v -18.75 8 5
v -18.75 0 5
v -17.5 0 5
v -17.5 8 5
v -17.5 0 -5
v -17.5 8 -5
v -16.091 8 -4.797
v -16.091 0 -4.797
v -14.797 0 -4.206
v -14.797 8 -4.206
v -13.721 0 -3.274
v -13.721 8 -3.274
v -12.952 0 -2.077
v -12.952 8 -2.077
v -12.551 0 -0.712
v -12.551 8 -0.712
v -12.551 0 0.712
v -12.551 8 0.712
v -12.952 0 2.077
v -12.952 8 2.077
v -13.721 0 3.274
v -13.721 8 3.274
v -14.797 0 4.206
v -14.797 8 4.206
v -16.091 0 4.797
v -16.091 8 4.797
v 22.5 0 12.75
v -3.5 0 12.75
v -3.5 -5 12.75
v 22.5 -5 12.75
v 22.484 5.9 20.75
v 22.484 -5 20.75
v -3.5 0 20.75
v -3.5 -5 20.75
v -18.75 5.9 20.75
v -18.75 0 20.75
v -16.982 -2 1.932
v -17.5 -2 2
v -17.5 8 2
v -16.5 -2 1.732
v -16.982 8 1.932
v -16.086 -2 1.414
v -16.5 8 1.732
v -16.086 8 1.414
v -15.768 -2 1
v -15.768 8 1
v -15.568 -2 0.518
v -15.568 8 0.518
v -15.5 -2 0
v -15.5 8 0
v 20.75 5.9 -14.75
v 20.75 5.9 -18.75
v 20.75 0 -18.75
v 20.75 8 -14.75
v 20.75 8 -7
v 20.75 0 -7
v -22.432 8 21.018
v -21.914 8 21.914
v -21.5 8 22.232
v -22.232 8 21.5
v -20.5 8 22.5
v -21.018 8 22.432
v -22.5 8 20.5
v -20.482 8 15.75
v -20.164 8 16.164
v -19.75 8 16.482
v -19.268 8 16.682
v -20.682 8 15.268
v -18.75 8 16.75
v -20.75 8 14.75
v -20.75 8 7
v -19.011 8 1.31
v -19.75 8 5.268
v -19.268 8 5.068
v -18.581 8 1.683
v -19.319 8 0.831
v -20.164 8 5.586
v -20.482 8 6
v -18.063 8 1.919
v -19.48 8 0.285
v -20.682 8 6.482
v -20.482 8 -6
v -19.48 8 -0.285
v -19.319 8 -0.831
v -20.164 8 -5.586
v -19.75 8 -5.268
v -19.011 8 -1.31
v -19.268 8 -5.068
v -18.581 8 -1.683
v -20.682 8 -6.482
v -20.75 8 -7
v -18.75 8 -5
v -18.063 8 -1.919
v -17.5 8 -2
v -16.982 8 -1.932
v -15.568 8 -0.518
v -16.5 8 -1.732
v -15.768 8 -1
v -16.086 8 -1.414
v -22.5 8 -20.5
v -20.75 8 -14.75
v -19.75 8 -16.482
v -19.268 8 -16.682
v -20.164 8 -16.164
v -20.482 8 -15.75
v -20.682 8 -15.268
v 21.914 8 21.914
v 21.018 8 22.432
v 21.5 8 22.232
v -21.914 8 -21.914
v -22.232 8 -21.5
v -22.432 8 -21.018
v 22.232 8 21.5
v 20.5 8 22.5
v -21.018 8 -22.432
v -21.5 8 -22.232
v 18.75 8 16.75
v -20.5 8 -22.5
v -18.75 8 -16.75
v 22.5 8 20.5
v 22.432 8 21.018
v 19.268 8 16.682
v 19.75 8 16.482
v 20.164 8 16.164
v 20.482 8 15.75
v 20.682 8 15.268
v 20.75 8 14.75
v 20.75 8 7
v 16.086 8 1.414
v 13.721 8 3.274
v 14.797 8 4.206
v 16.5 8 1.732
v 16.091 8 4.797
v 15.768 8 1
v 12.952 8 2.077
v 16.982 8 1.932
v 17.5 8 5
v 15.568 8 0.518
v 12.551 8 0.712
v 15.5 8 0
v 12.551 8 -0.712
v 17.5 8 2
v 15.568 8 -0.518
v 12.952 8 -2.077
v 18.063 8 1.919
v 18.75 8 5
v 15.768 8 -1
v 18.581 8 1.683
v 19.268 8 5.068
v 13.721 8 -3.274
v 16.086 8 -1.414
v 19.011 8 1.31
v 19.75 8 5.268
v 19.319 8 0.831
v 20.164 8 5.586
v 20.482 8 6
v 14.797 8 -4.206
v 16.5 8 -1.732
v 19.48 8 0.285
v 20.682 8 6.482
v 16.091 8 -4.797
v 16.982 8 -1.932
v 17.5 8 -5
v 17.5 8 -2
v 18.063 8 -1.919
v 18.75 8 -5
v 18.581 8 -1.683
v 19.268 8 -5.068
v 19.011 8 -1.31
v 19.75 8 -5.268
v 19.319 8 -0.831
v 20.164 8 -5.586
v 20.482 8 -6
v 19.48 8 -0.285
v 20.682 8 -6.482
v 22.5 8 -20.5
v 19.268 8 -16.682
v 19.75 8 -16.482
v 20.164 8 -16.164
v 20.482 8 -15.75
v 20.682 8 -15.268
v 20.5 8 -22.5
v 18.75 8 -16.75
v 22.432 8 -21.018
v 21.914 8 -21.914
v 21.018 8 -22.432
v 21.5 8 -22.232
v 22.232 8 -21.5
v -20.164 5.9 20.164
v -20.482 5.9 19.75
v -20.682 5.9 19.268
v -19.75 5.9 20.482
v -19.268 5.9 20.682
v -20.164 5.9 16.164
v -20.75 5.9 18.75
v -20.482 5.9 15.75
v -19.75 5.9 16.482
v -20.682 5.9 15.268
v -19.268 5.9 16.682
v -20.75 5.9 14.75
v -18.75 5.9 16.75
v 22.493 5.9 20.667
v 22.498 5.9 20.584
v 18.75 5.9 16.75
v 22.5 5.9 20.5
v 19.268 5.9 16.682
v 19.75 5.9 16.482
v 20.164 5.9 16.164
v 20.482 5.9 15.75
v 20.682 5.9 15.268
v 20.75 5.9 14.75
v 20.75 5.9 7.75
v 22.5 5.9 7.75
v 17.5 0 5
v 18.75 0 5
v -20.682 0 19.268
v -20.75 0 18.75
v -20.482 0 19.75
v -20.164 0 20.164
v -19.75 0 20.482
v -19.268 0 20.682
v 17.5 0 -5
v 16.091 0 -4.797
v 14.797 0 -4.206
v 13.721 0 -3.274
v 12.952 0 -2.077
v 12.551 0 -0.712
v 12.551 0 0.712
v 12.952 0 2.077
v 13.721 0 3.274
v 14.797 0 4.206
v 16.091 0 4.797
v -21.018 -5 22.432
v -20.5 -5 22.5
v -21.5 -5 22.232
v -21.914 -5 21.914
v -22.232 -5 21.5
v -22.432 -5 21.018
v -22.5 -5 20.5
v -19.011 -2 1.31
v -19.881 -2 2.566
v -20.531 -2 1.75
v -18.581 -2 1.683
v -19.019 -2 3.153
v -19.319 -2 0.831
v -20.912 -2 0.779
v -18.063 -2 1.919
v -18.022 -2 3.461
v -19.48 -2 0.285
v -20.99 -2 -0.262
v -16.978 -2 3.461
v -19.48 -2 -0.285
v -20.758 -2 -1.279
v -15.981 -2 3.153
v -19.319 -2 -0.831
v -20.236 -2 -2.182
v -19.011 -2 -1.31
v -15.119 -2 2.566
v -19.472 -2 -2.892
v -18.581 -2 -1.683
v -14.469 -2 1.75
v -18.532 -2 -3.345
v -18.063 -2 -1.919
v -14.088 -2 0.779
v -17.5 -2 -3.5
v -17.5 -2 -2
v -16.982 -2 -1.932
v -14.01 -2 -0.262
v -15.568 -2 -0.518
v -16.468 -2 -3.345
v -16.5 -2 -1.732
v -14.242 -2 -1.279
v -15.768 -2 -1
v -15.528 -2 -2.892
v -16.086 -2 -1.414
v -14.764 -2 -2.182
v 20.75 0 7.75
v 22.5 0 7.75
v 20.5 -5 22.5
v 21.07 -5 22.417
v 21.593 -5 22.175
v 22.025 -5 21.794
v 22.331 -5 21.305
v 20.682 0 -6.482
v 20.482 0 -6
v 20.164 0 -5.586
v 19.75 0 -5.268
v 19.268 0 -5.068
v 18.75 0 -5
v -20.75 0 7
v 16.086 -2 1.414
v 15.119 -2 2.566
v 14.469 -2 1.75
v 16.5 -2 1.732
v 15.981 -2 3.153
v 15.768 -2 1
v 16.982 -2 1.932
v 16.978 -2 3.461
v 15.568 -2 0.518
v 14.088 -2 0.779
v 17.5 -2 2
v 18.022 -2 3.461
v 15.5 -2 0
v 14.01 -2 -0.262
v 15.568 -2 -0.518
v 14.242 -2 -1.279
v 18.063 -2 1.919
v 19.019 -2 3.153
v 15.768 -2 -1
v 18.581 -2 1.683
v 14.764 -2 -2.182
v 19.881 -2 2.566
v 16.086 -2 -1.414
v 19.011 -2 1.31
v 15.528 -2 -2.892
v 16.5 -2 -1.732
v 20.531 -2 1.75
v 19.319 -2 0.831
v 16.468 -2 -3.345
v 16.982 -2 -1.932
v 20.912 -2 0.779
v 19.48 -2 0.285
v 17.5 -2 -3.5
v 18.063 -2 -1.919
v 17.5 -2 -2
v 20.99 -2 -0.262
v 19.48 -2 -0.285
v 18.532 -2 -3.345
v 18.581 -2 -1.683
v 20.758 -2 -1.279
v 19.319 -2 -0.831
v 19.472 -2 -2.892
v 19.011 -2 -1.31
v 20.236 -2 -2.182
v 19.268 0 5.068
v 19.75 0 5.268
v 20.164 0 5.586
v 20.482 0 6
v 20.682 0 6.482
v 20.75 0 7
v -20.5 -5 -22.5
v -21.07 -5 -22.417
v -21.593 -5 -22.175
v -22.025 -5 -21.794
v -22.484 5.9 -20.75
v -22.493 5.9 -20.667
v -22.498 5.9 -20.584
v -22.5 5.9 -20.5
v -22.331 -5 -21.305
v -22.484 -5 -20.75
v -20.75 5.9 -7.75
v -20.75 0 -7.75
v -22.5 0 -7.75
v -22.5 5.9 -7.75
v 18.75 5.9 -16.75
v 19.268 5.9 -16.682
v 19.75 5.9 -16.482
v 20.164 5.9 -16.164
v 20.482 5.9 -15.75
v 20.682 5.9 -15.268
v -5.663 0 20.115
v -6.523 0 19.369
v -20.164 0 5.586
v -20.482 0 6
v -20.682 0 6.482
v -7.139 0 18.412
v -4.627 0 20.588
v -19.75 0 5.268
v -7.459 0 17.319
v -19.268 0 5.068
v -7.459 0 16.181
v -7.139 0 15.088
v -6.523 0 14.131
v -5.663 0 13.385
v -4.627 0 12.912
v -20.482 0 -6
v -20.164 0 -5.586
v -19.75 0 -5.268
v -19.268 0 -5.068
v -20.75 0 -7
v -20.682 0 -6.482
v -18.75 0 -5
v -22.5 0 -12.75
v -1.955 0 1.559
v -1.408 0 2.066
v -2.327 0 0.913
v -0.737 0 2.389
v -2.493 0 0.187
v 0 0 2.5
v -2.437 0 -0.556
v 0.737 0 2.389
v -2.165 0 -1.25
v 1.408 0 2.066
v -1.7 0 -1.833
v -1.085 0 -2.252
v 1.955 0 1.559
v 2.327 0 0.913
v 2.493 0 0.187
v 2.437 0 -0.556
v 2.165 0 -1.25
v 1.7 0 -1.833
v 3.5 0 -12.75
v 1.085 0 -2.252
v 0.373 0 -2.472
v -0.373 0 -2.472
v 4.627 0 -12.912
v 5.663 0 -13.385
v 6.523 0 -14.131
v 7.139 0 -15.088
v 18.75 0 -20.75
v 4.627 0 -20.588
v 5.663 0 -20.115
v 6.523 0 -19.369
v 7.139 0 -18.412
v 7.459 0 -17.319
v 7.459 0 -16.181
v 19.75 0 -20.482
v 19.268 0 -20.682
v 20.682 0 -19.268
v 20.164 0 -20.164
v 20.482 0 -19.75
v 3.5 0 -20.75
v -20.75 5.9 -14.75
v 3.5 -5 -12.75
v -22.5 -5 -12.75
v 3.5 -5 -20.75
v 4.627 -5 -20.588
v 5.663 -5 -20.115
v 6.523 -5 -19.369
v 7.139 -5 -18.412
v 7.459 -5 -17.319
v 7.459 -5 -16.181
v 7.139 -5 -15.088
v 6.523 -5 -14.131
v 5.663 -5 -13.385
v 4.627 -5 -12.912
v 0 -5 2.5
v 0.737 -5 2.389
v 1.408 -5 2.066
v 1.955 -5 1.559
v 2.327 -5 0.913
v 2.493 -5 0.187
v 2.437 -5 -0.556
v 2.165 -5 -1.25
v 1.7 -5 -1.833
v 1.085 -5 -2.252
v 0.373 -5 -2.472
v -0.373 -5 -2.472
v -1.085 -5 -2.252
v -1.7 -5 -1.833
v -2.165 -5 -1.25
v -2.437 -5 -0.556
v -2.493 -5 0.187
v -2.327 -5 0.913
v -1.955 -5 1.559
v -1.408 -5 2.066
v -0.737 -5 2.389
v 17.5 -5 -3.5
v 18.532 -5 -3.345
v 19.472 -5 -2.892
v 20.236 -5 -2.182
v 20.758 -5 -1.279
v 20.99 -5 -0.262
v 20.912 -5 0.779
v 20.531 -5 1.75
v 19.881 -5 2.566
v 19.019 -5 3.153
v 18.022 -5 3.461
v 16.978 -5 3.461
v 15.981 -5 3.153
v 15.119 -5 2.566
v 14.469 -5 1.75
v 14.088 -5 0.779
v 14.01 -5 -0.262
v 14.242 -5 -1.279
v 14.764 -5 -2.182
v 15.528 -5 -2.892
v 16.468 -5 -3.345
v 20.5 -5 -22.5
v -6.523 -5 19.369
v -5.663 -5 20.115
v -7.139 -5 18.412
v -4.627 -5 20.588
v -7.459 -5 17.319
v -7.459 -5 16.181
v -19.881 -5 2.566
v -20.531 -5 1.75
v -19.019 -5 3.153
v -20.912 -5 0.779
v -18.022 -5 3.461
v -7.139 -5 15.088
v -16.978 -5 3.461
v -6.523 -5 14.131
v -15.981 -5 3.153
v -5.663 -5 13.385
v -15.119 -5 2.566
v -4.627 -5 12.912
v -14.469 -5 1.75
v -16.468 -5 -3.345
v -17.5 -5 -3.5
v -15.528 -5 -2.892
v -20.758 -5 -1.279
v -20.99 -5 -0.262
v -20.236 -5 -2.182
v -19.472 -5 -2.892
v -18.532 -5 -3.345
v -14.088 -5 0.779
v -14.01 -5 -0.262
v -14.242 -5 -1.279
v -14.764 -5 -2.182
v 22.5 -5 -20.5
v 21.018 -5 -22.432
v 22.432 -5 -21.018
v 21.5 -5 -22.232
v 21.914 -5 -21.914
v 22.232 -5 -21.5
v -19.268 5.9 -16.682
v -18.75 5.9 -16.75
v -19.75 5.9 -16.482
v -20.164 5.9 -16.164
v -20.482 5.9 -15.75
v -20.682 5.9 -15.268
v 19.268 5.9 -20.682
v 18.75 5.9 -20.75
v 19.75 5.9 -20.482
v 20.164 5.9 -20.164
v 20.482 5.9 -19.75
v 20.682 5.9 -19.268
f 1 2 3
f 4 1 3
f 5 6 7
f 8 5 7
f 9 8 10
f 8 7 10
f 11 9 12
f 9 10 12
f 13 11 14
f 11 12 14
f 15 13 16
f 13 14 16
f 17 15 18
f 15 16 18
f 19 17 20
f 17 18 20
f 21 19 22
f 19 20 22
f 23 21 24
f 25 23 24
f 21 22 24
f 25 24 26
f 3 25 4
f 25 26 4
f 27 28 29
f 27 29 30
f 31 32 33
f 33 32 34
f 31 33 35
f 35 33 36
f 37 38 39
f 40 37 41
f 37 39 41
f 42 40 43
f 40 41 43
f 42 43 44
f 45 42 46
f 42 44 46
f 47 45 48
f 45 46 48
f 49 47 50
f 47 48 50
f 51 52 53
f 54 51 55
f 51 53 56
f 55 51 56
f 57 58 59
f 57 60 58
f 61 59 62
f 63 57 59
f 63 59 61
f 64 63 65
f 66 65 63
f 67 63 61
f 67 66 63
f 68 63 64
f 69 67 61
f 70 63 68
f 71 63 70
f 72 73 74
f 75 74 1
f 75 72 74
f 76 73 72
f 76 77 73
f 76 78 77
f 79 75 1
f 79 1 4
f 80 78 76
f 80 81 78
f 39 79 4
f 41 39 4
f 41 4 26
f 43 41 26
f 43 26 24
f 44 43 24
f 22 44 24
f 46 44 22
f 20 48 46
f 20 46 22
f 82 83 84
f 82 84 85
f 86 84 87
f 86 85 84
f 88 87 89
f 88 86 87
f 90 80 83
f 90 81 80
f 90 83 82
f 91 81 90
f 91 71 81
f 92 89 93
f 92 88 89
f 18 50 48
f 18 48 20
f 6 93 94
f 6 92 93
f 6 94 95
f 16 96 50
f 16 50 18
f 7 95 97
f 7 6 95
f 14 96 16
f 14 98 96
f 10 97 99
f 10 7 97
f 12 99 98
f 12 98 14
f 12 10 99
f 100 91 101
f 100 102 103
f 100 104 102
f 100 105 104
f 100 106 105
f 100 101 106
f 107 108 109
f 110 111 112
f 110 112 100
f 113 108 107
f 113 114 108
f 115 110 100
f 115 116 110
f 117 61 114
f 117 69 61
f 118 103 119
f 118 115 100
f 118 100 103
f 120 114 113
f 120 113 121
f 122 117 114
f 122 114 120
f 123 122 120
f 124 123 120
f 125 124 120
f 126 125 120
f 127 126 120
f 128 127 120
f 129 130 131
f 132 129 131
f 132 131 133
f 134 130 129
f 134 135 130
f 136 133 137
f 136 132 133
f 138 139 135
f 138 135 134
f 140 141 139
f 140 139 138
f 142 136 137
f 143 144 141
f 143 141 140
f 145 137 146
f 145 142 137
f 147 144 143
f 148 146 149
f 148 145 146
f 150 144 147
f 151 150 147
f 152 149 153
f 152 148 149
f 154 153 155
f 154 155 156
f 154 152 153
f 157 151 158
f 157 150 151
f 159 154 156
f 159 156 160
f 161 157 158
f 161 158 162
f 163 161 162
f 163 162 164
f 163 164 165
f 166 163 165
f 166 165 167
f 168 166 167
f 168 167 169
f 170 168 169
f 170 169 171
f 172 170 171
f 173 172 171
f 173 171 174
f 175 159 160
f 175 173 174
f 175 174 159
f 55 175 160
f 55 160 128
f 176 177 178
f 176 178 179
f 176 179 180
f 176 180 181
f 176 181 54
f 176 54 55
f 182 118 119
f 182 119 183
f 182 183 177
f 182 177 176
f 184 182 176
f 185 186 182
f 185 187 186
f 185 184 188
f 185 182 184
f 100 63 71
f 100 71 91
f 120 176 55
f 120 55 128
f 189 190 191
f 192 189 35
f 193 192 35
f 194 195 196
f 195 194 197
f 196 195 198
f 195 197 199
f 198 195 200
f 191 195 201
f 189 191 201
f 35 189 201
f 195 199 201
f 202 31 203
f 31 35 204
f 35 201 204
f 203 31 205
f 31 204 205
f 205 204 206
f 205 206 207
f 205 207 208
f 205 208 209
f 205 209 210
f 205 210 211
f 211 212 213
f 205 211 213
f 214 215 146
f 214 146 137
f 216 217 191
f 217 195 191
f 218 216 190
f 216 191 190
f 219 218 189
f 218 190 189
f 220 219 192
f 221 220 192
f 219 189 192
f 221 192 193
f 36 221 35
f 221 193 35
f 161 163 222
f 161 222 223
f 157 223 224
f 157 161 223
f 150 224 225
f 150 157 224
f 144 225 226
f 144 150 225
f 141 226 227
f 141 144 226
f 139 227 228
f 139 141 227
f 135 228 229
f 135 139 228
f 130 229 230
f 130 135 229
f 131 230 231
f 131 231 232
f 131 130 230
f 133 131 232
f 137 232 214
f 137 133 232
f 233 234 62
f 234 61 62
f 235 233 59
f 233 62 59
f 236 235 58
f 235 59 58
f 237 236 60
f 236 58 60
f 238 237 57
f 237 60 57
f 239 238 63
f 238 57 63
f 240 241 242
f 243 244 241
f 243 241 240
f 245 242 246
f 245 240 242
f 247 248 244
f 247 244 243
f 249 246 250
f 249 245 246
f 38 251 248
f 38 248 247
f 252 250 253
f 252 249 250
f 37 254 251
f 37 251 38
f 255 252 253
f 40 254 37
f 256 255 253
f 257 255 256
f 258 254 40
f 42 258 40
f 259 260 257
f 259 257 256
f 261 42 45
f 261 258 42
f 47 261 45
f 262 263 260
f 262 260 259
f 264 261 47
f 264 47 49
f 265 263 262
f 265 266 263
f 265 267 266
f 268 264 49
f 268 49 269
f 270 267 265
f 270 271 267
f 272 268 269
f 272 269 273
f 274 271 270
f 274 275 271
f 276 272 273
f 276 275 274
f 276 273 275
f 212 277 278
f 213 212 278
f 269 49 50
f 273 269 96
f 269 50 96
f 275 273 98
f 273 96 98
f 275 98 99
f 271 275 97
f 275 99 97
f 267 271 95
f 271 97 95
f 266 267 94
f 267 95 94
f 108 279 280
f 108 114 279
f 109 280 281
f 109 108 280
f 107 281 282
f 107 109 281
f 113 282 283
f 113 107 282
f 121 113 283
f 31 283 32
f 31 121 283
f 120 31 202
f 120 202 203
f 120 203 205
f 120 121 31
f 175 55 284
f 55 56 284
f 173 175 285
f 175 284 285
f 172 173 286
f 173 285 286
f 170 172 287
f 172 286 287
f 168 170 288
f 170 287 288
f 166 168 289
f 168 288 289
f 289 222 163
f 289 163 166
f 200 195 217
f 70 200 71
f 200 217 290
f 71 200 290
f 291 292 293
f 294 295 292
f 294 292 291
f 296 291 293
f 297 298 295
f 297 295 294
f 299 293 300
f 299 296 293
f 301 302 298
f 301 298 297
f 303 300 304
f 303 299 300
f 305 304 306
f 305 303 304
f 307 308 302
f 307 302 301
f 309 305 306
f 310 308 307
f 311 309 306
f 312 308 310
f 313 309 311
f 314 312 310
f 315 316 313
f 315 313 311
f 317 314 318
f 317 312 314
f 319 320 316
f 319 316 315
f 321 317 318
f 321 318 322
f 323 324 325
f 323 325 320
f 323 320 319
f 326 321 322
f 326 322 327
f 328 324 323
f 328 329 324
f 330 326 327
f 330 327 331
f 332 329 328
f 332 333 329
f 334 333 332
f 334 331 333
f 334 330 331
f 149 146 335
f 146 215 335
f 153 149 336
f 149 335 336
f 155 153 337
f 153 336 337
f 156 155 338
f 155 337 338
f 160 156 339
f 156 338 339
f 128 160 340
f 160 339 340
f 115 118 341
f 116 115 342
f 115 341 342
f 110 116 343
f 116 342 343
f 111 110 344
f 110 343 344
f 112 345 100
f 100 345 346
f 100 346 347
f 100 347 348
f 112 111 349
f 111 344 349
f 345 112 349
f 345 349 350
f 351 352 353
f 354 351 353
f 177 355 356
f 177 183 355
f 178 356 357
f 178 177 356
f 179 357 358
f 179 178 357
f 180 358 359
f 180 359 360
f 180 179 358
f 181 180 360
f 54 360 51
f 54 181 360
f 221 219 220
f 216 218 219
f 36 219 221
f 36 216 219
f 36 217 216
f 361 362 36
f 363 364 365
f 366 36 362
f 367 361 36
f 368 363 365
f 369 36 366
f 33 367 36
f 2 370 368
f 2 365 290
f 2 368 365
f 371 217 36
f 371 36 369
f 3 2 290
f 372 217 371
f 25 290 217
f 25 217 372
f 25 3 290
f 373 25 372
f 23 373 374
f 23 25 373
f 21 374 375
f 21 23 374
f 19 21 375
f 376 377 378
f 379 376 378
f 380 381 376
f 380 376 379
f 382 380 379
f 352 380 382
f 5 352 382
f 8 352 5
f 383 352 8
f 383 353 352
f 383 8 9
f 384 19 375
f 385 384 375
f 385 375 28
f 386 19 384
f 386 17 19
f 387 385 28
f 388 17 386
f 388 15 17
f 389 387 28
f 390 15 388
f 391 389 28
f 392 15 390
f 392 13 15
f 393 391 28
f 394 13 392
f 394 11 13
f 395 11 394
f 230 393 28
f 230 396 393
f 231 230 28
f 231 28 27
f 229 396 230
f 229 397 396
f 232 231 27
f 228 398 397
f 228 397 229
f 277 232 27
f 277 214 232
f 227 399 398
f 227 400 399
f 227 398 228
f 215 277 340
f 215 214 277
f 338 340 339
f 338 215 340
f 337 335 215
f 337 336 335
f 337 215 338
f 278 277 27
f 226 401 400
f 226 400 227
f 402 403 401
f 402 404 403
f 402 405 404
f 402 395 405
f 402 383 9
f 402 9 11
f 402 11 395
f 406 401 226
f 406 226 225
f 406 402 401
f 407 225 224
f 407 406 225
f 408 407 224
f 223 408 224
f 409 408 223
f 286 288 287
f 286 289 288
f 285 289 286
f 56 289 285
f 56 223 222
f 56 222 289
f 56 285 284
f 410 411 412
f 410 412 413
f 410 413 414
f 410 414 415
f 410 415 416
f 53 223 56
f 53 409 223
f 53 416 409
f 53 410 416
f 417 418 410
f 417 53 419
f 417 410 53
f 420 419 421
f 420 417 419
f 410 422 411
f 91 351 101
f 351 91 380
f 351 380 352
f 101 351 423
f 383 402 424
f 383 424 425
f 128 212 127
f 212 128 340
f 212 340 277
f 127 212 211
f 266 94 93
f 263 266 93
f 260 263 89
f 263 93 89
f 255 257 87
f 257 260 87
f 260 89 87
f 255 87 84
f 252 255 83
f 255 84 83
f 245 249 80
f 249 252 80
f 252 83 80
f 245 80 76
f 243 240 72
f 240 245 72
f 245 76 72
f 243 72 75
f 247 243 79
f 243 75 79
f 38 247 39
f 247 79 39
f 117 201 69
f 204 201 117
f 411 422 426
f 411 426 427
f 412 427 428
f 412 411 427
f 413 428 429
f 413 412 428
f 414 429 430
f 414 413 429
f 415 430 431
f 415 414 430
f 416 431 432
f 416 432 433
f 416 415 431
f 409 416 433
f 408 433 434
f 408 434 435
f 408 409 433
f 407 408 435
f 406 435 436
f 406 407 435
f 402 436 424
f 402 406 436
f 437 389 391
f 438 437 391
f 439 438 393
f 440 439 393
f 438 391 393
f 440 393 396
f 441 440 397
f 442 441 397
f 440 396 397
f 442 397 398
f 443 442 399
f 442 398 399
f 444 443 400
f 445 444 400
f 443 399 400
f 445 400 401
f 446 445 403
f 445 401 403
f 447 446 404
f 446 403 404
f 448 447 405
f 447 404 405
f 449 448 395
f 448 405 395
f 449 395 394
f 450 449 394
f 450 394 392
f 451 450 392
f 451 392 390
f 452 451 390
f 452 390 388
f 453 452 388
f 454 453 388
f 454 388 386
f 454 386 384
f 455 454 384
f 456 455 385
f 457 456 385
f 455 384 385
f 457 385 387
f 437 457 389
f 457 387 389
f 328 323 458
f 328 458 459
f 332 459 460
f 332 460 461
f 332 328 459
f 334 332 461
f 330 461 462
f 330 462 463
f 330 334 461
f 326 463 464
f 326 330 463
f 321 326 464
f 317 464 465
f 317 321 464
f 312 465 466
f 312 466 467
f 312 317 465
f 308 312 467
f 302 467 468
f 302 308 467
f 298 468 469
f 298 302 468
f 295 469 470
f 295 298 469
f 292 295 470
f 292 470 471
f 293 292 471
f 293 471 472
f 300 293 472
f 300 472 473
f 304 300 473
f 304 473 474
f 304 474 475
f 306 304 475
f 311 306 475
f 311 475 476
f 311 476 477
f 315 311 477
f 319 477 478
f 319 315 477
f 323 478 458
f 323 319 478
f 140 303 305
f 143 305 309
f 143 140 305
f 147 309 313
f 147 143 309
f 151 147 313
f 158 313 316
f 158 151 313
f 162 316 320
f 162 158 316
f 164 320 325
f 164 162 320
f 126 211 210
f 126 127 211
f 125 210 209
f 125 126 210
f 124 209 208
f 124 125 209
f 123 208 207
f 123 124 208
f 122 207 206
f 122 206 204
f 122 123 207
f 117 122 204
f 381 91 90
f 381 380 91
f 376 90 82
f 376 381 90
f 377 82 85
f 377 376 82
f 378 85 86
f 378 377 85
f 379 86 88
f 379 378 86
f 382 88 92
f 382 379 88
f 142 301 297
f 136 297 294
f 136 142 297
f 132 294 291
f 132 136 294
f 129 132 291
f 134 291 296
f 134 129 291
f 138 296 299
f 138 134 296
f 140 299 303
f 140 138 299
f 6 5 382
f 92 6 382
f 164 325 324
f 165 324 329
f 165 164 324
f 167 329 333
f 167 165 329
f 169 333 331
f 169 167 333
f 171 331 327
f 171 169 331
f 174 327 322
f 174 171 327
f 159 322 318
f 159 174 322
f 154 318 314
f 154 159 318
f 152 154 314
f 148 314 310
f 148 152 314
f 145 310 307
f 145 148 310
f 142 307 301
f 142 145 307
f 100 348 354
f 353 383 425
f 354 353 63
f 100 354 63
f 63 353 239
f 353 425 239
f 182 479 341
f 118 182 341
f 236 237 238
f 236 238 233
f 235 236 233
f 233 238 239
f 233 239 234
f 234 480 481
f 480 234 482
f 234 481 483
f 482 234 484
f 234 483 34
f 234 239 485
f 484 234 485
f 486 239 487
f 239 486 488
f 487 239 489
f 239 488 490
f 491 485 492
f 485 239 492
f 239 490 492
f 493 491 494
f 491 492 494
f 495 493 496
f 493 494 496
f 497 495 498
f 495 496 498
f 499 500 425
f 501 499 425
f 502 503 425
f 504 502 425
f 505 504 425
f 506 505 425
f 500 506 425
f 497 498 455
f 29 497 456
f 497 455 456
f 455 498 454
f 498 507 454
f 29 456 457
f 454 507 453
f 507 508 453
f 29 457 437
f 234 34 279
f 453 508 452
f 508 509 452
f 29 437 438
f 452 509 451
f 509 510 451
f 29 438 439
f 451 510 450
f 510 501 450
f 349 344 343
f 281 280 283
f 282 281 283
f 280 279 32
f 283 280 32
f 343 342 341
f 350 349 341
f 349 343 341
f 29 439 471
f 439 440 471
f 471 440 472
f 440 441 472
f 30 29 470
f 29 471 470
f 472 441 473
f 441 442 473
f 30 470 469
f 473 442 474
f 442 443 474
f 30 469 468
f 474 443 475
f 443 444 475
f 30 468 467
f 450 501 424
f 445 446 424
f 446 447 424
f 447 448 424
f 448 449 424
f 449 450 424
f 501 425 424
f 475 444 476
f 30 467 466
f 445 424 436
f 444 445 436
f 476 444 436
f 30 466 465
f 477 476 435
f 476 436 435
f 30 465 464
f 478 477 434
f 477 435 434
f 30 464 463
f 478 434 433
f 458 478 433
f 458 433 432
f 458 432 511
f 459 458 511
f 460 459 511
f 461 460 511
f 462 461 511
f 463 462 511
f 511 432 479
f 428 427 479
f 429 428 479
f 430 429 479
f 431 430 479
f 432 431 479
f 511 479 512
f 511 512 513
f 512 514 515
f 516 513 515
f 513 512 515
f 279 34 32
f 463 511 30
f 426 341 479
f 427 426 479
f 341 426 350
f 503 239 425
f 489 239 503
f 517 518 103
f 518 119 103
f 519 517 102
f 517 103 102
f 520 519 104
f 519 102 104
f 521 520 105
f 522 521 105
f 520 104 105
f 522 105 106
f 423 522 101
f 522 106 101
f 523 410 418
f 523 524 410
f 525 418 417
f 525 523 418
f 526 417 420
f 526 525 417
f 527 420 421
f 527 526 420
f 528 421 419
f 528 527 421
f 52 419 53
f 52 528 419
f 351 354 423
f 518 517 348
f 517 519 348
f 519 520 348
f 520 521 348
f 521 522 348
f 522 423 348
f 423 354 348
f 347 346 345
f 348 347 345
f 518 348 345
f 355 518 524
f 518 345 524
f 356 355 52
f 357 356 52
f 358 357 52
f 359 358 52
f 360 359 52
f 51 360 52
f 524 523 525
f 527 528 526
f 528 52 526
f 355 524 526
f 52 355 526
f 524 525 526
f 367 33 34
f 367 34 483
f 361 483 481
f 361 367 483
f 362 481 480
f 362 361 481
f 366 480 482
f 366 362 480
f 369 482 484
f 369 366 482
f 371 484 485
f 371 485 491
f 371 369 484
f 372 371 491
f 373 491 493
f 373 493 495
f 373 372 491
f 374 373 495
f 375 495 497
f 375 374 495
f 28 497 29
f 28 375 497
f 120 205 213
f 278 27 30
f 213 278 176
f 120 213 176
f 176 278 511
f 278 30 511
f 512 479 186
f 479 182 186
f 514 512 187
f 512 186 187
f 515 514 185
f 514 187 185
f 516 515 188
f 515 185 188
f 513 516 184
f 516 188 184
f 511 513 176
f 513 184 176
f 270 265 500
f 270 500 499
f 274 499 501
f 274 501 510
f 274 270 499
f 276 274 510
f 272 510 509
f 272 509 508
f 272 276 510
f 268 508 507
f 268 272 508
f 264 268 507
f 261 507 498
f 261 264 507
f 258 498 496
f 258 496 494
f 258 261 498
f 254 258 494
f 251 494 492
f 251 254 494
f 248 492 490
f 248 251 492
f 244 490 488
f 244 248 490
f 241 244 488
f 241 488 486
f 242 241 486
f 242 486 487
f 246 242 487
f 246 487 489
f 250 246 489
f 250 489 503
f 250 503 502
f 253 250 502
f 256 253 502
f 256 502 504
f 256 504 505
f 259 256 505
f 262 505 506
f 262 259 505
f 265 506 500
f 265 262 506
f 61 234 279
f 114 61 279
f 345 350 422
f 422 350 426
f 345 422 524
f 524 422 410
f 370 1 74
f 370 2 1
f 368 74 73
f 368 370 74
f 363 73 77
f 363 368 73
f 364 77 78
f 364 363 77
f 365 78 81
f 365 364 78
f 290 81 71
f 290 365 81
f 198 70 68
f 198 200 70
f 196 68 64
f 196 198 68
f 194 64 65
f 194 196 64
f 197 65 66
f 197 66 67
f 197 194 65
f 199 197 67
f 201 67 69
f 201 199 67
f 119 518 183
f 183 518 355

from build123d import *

# Parameters (mm, degrees)
CROQUIS1_R                   = 2.5
SALIENTE_EXTRUIR1_DEPTH      = 5
SALIENTE_EXTRUIR2_DEPTH      = 6
SALIENTE_EXTRUIR5_DEPTH      = 2
SALIENTE_EXTRUIR5_DEPTH_BACK = 0.1
CROQUIS2_W                   = 41.5
CROQUIS2_H                   = 5.75
CROQUIS2_H_2                 = 4
CROQUIS2_H_3                 = 1.75
CROQUIS2_W_2                 = 1.75
CROQUIS3_R                   = 2
SALIENTE_EXTRUIR6_DEPTH      = 8
CORTAR_EXTRUIR1_REACH        = 36.373
CORTAR_EXTRUIR2_START        = -3
CROQUIS4_R                   = 3.5
CROQUIS4_R_2                 = 2
CORTAR_EXTRUIR2_DEPTH        = 3
REDONDEO1_R                  = 2
REDONDEO2_R                  = 2


with BuildPart() as part:
    # Croquis1 → Saliente-Extruir1 (new body)
    with BuildSketch(Plane(origin=(0, 0, 0), x_dir=(1, 0, 0), z_dir=(0, 1, 0))):
        with BuildLine():
            Line((-22.5, -22.5), (22.5, -22.5))
            Line((22.5, -22.5), (22.5, -20.75))
            Line((22.5, -20.75), (-3.5, -20.75))
            ThreePointArc((-3.5, -20.75), (-7.5, -16.75), (-3.5, -12.75))
            Line((-3.5, -12.75), (22.5, -12.75))
            Line((22.5, -12.75), (22.5, 22.5))
            Line((22.5, 22.5), (-22.5, 22.5))
            Line((-22.5, 22.5), (-22.5, 20.75))
            Line((-22.5, 20.75), (3.5, 20.75))
            ThreePointArc((3.5, 20.75), (7.5, 16.75), (3.5, 12.75))
            Line((3.5, 12.75), (-22.5, 12.75))
            Line((-22.5, 12.75), (-22.5, -22.5))
        make_face()
        with Locations(Location((0, 0, 0), (0, 0, 270))):
            Circle(CROQUIS1_R, mode=Mode.SUBTRACT)
    extrude(amount=-SALIENTE_EXTRUIR1_DEPTH)

    # Croquis1<3> → Saliente-Extruir2 (add)
    with BuildSketch(Plane(origin=(0, 0, 0), x_dir=(1, 0, 0), z_dir=(0, 1, 0))):
        Polygon((-22.5, 7.75), (-22.5, -22.5), (22.5, -22.5), (22.5, -20.75), (-3.5, -20.75), (-20.75, -20.75), (-20.75, 7.75), align=None)
        Polygon((-22.5, 22.5), (-22.5, 20.75), (3.5, 20.75), (20.75, 20.75), (20.75, -7.75), (22.5, -7.75), (22.5, 22.5), align=None)
    extrude(amount=SALIENTE_EXTRUIR2_DEPTH)

    # Croquis2 → Saliente-Extruir5 (add, two sides: drawn at the far end of the back side and taken through both)
    with BuildSketch(Plane(origin=(0, 6, 0), x_dir=(1, 0, 0), z_dir=(0, 1, 0)).offset(-SALIENTE_EXTRUIR5_DEPTH_BACK)):
        with Locations((0, 19.625)):
            Rectangle(CROQUIS2_W, CROQUIS2_H)
        Polygon((-20.75, 22.5), (-22.5, 22.5), (-22.5, 7.75), (-20.75, 7.75), (-20.75, 16.75), align=None)
        with Locations((0, -18.75)):
            Rectangle(CROQUIS2_W, CROQUIS2_H_2)
        with Locations((0, -21.625)):
            Rectangle(CROQUIS2_W, CROQUIS2_H_3)
        Polygon((-20.75, 7.75), (-22.5, 7.75), (-22.5, -22.5), (-20.75, -22.5), (-20.75, -20.75), (-20.75, -16.75), align=None)
        Polygon((22.5, 22.5), (20.75, 22.5), (20.75, 16.75), (20.75, -16.75), (20.75, -20.75), (22.5, -20.75), align=None)
        with Locations((21.625, -21.625)):
            Rectangle(CROQUIS2_W_2, CROQUIS2_H_3)
    extrude(amount=SALIENTE_EXTRUIR5_DEPTH + SALIENTE_EXTRUIR5_DEPTH_BACK)

    # Croquis3 → Saliente-Extruir6 (add)
    with BuildSketch(Plane(origin=(0, 8, 0), x_dir=(1, 0, 0), z_dir=(0, 1, 0))):
        with BuildLine():
            Line((-20.75, 5), (-20.75, -5))
            Line((-20.75, -5), (-17.5, -5))
            Line((-17.5, -5), (-17.5, -2))
            ThreePointArc((-17.5, -2), (-19.5, 0), (-17.5, 2))
            Line((-17.5, 2), (-17.5, 5))
            Line((-17.5, 5), (-20.75, 5))
        make_face()
        with Locations((-17.5, 0)):
            Circle(CROQUIS3_R)
        with BuildLine():
            Line((-17.5, -5), (-17.5, 5))
            ThreePointArc((-17.5, 5), (-12.5, 0), (-17.5, -5))
        make_face()
        with BuildLine():
            ThreePointArc((-17.5, 2), (-19.5, 0), (-17.5, -2))
            Line((-17.5, -2), (-17.5, 2))
        make_face()
        with BuildLine():
            Line((-17.5, 2), (-17.5, -2))
            ThreePointArc((-17.5, -2), (-16.085786438, -1.414213562), (-15.5, 0))
            ThreePointArc((-15.5, 0), (-16.085786438, 1.414213562), (-17.5, 2))
        make_face()
    saliente_extruir6 = extrude(amount=-SALIENTE_EXTRUIR6_DEPTH)

    # Croquis3<3> → Cortar-Extruir1 (cut, up to next)
    with BuildSketch(Plane(origin=(0, 8, 0), x_dir=(1, 0, 0), z_dir=(0, 1, 0)), mode=Mode.PRIVATE) as cortar_extruir1_sk1:
        with BuildLine():
            ThreePointArc((-17.5, 2), (-19.5, 0), (-17.5, -2))
            Line((-17.5, -2), (-17.5, 2))
        make_face()
    cortar_extruir1_tool1 = extrude(cortar_extruir1_sk1.sketch, amount=-CORTAR_EXTRUIR1_REACH, mode=Mode.PRIVATE) & part.part
    # Croquis3<3> → Cortar-Extruir1 (cut, up to next)
    with BuildSketch(Plane(origin=(0, 8, 0), x_dir=(1, 0, 0), z_dir=(0, 1, 0)), mode=Mode.PRIVATE) as cortar_extruir1_sk2:
        with BuildLine():
            Line((-17.5, 2), (-17.5, -2))
            ThreePointArc((-17.5, -2), (-16.085786438, -1.414213562), (-15.5, 0))
            ThreePointArc((-15.5, 0), (-16.085786438, 1.414213562), (-17.5, 2))
        make_face()
    cortar_extruir1_tool2 = extrude(cortar_extruir1_sk2.sketch, amount=-CORTAR_EXTRUIR1_REACH, mode=Mode.PRIVATE) & part.part
    # Croquis3<3> → Cortar-Extruir1 (cut, up to next)
    with BuildSketch(Plane(origin=(0, 8, 0), x_dir=(1, 0, 0), z_dir=(0, 1, 0)), mode=Mode.PRIVATE) as cortar_extruir1_sk3:
        with BuildLine():
            ThreePointArc((-17.5, 2), (-19.5, 0), (-17.5, -2))
            Line((-17.5, -2), (-17.5, 2))
        make_face()
    cortar_extruir1_tool3 = extrude(cortar_extruir1_sk3.sketch, amount=-CORTAR_EXTRUIR1_REACH, mode=Mode.PRIVATE) & part.part
    # Croquis3<3> → Cortar-Extruir1 (cut, up to next)
    with BuildSketch(Plane(origin=(0, 8, 0), x_dir=(1, 0, 0), z_dir=(0, 1, 0)), mode=Mode.PRIVATE) as cortar_extruir1_sk4:
        with BuildLine():
            Line((-17.5, 2), (-17.5, -2))
            ThreePointArc((-17.5, -2), (-16.085786438, -1.414213562), (-15.5, 0))
            ThreePointArc((-15.5, 0), (-16.085786438, 1.414213562), (-17.5, 2))
        make_face()
    cortar_extruir1_tool4 = extrude(cortar_extruir1_sk4.sketch, amount=-CORTAR_EXTRUIR1_REACH, mode=Mode.PRIVATE) & part.part
    cortar_extruir1_1 = cortar_extruir1_tool1.solids().sort_by_distance((-18.348826, 8, 0))[0]
    add(cortar_extruir1_1, mode=Mode.SUBTRACT)
    cortar_extruir1_2 = cortar_extruir1_tool2.solids().sort_by_distance((-16.651174, 8, 0))[0]
    add(cortar_extruir1_2, mode=Mode.SUBTRACT)
    cortar_extruir1_3 = cortar_extruir1_tool3.solids().sort_by_distance((-18.348826, 8, 0))[0]
    add(cortar_extruir1_3, mode=Mode.SUBTRACT)
    cortar_extruir1_4 = cortar_extruir1_tool4.solids().sort_by_distance((-16.651174, 8, 0))[0]
    add(cortar_extruir1_4, mode=Mode.SUBTRACT)
    cortar_extruir1 = cortar_extruir1_1 + cortar_extruir1_2 + cortar_extruir1_3 + cortar_extruir1_4  # Cortar-Extruir1 as one shape, for the pattern or mirror that repeats it

    # Simetría1: Saliente-Extruir6, Cortar-Extruir1 across plane
    add(saliente_extruir6.mirror(Plane(origin=(0, 0, 0), x_dir=(0, 0, 1), z_dir=(1, 0, 0))))
    add(cortar_extruir1.mirror(Plane(origin=(0, 0, 0), x_dir=(0, 0, 1), z_dir=(1, 0, 0))), mode=Mode.SUBTRACT)

    # Croquis4 → Cortar-Extruir2 (cut)
    # profile 1 of 2: a face of its own
    with BuildSketch(Plane.XZ.offset(5).offset(CORTAR_EXTRUIR2_START)):
        with Locations(Location((-17.5, 0, 0), (0, 0, 270))):
            Circle(CROQUIS4_R)
        with Locations(Location((-17.5, 0, 0), (0, 0, 90))):
            Circle(CROQUIS4_R_2, mode=Mode.SUBTRACT)
    # profile 2 of 2: a face of its own
    with BuildSketch(Plane.XZ.offset(5).offset(CORTAR_EXTRUIR2_START)):
        with Locations(Location((17.5, 0, 0), (0, 0, 270))):
            Circle(CROQUIS4_R)
        with Locations(Location((17.5, 0, 0), (0, 0, 90))):
            Circle(CROQUIS4_R_2, mode=Mode.SUBTRACT)
    extrude(amount=CORTAR_EXTRUIR2_DEPTH, mode=Mode.SUBTRACT)

    # Redondeo1
    redondeo1_edges = [part.edges().sort_by_distance(p)[0] for p in [
        (20.75, 6.95, 16.75),
        (-20.75, 6.95, 16.75),
        (20.75, 6.95, -16.75),
        (-20.75, 4, -5),
        (-20.75, 4, 5),
        (20.75, 4, 5),
        (20.75, 4, -5),
        (-20.75, 6.95, -16.75),
    ]]
    fillet(redondeo1_edges, radius=REDONDEO1_R)

    # Redondeo2
    redondeo2_edges = [part.edges().sort_by_distance(p)[0] for p in [
        (-22.5, 1.5, -22.5),
        (22.5, 1.5, -22.5),
        (-22.5, 1.5, 22.5),
        (22.5, 1.5, 22.5),
        (20.75, 2.95, -20.75),
        (-20.75, 2.95, 20.75),
    ]]
    fillet(redondeo2_edges, radius=REDONDEO2_R)


solid = part.part
